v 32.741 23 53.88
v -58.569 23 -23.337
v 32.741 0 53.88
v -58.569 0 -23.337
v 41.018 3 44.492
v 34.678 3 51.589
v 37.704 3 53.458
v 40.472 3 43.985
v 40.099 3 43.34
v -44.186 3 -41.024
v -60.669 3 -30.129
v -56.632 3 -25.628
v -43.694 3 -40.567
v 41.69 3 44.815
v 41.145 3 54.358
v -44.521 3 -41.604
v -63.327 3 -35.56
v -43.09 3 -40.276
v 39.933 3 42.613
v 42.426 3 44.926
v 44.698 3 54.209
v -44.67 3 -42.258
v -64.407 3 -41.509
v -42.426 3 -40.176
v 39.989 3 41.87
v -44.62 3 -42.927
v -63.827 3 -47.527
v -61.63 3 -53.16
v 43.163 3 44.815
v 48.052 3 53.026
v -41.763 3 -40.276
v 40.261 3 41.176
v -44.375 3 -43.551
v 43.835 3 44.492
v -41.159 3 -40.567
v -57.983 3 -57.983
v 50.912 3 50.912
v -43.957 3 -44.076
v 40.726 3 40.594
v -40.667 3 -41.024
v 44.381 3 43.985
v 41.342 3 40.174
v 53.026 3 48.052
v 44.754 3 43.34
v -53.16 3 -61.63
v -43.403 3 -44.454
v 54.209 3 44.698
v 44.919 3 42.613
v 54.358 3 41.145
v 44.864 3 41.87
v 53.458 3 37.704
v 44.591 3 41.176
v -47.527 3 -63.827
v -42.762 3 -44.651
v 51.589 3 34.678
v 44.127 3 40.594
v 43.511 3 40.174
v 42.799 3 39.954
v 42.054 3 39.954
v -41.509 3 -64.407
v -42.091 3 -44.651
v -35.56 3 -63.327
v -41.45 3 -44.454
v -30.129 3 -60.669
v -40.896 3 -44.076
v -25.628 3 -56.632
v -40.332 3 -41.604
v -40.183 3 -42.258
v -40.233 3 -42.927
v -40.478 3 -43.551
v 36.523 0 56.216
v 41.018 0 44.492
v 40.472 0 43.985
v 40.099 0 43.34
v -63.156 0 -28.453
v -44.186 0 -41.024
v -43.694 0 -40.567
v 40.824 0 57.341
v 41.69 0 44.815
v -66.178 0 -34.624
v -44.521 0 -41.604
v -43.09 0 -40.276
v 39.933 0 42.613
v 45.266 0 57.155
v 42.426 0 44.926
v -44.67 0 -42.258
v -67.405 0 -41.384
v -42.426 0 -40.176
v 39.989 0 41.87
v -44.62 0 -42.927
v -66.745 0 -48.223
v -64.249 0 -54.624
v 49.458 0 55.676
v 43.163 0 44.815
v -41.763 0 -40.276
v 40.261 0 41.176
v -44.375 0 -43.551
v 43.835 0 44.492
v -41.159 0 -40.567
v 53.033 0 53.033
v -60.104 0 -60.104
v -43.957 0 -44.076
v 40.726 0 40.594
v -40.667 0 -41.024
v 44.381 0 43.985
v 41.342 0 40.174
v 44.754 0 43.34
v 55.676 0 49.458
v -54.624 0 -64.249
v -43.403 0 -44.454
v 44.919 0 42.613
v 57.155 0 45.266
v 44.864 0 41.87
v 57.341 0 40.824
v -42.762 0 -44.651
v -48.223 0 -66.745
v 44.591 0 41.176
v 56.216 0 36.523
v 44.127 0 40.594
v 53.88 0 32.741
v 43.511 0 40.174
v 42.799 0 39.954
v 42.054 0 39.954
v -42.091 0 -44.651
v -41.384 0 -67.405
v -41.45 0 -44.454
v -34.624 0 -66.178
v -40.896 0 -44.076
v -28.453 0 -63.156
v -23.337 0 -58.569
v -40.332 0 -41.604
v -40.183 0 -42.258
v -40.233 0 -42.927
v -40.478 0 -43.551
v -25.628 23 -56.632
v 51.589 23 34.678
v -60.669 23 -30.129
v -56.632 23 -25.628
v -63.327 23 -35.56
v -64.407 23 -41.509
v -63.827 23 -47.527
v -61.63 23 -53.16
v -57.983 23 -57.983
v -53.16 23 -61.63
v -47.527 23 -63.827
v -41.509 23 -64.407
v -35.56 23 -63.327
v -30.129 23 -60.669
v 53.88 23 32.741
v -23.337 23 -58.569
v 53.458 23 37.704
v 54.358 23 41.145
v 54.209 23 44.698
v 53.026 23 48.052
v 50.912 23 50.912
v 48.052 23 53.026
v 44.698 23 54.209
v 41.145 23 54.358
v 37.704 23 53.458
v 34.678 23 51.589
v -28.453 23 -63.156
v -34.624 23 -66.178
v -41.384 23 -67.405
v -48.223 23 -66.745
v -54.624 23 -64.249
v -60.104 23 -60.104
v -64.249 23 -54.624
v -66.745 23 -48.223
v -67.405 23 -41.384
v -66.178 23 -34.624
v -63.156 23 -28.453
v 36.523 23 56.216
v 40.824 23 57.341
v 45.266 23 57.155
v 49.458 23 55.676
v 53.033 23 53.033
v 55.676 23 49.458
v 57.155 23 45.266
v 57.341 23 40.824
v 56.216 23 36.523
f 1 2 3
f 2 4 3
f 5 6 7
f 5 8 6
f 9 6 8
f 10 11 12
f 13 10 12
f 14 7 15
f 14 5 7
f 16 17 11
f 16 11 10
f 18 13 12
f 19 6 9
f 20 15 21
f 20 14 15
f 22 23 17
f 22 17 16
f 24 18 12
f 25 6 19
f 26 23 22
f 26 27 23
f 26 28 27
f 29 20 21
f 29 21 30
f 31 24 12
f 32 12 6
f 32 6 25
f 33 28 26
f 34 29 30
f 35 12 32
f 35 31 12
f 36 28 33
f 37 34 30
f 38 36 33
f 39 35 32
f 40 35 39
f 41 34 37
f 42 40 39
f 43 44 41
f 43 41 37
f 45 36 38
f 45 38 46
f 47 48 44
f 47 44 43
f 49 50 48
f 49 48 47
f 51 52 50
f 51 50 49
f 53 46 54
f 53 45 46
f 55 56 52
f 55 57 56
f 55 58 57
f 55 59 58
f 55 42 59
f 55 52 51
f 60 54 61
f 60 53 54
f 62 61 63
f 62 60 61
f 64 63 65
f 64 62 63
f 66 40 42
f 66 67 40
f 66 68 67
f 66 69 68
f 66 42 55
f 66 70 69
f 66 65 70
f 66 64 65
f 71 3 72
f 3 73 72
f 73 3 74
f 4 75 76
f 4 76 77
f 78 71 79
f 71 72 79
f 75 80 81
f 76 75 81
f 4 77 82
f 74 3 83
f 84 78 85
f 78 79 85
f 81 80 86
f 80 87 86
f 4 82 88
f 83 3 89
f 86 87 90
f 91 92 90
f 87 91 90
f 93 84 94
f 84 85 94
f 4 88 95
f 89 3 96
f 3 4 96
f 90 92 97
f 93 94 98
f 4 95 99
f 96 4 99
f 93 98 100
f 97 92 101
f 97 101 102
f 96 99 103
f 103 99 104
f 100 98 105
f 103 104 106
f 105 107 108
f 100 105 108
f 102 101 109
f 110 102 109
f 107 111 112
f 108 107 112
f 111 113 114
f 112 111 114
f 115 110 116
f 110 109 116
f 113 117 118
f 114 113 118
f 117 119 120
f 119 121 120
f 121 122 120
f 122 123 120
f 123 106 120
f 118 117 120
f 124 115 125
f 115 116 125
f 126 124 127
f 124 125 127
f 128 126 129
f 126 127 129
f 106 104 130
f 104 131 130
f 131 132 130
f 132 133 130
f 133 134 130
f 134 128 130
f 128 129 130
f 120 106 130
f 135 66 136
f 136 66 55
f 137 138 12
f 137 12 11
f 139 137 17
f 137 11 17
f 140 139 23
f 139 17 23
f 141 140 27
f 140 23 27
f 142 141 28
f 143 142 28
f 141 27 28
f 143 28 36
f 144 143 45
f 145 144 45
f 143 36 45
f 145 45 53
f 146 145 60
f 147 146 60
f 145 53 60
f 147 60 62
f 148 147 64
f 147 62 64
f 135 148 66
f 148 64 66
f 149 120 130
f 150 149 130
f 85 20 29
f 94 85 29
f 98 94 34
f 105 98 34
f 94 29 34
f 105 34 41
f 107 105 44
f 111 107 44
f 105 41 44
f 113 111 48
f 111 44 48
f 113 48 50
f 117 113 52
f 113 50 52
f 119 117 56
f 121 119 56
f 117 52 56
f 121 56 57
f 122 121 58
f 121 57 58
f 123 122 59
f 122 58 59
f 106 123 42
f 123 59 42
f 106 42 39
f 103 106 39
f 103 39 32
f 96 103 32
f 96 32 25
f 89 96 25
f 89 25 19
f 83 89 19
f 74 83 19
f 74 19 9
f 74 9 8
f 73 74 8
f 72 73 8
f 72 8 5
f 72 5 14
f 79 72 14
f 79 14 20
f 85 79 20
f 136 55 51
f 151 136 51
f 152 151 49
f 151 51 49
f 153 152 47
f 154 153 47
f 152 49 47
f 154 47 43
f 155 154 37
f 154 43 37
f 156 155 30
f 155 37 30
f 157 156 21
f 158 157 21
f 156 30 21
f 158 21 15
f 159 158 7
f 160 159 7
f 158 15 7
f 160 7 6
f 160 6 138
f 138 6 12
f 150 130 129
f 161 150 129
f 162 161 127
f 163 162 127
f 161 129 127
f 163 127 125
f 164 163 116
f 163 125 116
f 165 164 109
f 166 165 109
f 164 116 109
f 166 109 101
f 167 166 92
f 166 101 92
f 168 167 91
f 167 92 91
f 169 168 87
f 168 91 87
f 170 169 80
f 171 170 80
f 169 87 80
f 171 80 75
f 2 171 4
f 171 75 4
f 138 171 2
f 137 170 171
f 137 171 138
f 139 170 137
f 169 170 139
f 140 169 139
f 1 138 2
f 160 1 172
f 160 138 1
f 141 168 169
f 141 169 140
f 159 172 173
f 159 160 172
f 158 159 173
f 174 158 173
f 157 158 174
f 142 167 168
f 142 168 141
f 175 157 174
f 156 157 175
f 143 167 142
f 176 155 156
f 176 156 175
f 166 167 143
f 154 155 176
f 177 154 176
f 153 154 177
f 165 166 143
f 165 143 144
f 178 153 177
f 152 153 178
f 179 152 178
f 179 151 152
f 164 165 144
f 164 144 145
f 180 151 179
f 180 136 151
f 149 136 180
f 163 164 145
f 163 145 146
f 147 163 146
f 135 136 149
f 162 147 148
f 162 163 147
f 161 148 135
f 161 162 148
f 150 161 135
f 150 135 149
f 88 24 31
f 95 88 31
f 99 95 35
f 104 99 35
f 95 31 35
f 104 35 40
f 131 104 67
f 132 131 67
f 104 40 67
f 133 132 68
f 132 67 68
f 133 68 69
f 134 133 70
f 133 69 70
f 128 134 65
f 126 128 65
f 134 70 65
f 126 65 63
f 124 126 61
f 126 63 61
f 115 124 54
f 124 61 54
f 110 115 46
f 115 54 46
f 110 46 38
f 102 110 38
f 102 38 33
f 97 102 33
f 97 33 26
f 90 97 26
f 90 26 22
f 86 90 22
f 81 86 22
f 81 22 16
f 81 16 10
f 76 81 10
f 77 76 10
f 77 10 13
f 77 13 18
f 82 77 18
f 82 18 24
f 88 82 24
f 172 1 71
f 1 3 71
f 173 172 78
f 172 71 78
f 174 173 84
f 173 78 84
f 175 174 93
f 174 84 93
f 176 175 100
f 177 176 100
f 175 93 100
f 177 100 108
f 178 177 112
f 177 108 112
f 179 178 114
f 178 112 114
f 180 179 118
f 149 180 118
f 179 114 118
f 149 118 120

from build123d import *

# Parameters (mm, degrees)
EXTRUDE_2_DEPTH     = 3
EXTRUDE_3_DEPTH     = 20
SKETCH_5_R          = 2.25
SKETCH_5_R_2        = 2.5
CUT_EXTRUDE_1_DEPTH = 98.430183655


with BuildPart() as part:
    # 草图2 → 凸台-拉伸2 (new body)
    with BuildSketch(Plane(origin=(0, 0, 0), x_dir=(1, 0, 0), z_dir=(0, 1, 0))):
        with BuildLine():
            Line((-58.569449541, 23.337085947), (32.740581269, -53.879999426))
            ThreePointArc((32.740581269, -53.879999426), (53.033008589, -53.033008589), (53.879999426, -32.740581269))
            Line((53.879999426, -32.740581269), (-23.337085947, 58.569449541))
            ThreePointArc((-23.337085947, 58.569449541), (-60.104076401, 60.104076401), (-58.569449541, 23.337085947))
        make_face()
    extrude(amount=EXTRUDE_2_DEPTH)

    # 草图4 → 凸台-拉伸3 (add)
    with BuildSketch(Plane(origin=(0, 3, 0), x_dir=(1, 0, 0), z_dir=(0, 1, 0))):
        with BuildLine():
            ThreePointArc((-23.337085947, 58.569449541), (-60.104076401, 60.104076401), (-58.569449541, 23.337085947))
            Line((-58.569449541, 23.337085947), (32.740581269, -53.879999426))
            ThreePointArc((32.740581269, -53.879999426), (53.033008589, -53.033008589), (53.879999426, -32.740581269))
            Line((53.879999426, -32.740581269), (-23.337085947, 58.569449541))
        make_face()
        with BuildLine():
            ThreePointArc((-56.632284421, 25.627804458), (-57.982756057, 57.982756057), (-25.627804458, 56.632284421))
            Line((-25.627804458, 56.632284421), (51.589280915, -34.67774639))
            ThreePointArc((51.589280915, -34.67774639), (50.911688245, -50.911688245), (34.67774639, -51.589280915))
            Line((34.67774639, -51.589280915), (-56.632284421, 25.627804458))
        make_face(mode=Mode.SUBTRACT)
    extrude(amount=EXTRUDE_3_DEPTH)

    # 草图5 → 切除-拉伸1 (cut, through all)
    with BuildSketch(Plane(origin=(0, 3, 0), x_dir=(1, 0, 0), z_dir=(0, 1, 0))):
        with Locations(Location((-42.426406871, 42.426406871, 0), (0, 0, 270))):
            Circle(SKETCH_5_R)
        with Locations(Location((42.426406871, -42.426406871, 0), (0, 0, 270))):
            Circle(SKETCH_5_R_2)
    extrude(amount=-CUT_EXTRUDE_1_DEPTH, mode=Mode.SUBTRACT)


solid = part.part
